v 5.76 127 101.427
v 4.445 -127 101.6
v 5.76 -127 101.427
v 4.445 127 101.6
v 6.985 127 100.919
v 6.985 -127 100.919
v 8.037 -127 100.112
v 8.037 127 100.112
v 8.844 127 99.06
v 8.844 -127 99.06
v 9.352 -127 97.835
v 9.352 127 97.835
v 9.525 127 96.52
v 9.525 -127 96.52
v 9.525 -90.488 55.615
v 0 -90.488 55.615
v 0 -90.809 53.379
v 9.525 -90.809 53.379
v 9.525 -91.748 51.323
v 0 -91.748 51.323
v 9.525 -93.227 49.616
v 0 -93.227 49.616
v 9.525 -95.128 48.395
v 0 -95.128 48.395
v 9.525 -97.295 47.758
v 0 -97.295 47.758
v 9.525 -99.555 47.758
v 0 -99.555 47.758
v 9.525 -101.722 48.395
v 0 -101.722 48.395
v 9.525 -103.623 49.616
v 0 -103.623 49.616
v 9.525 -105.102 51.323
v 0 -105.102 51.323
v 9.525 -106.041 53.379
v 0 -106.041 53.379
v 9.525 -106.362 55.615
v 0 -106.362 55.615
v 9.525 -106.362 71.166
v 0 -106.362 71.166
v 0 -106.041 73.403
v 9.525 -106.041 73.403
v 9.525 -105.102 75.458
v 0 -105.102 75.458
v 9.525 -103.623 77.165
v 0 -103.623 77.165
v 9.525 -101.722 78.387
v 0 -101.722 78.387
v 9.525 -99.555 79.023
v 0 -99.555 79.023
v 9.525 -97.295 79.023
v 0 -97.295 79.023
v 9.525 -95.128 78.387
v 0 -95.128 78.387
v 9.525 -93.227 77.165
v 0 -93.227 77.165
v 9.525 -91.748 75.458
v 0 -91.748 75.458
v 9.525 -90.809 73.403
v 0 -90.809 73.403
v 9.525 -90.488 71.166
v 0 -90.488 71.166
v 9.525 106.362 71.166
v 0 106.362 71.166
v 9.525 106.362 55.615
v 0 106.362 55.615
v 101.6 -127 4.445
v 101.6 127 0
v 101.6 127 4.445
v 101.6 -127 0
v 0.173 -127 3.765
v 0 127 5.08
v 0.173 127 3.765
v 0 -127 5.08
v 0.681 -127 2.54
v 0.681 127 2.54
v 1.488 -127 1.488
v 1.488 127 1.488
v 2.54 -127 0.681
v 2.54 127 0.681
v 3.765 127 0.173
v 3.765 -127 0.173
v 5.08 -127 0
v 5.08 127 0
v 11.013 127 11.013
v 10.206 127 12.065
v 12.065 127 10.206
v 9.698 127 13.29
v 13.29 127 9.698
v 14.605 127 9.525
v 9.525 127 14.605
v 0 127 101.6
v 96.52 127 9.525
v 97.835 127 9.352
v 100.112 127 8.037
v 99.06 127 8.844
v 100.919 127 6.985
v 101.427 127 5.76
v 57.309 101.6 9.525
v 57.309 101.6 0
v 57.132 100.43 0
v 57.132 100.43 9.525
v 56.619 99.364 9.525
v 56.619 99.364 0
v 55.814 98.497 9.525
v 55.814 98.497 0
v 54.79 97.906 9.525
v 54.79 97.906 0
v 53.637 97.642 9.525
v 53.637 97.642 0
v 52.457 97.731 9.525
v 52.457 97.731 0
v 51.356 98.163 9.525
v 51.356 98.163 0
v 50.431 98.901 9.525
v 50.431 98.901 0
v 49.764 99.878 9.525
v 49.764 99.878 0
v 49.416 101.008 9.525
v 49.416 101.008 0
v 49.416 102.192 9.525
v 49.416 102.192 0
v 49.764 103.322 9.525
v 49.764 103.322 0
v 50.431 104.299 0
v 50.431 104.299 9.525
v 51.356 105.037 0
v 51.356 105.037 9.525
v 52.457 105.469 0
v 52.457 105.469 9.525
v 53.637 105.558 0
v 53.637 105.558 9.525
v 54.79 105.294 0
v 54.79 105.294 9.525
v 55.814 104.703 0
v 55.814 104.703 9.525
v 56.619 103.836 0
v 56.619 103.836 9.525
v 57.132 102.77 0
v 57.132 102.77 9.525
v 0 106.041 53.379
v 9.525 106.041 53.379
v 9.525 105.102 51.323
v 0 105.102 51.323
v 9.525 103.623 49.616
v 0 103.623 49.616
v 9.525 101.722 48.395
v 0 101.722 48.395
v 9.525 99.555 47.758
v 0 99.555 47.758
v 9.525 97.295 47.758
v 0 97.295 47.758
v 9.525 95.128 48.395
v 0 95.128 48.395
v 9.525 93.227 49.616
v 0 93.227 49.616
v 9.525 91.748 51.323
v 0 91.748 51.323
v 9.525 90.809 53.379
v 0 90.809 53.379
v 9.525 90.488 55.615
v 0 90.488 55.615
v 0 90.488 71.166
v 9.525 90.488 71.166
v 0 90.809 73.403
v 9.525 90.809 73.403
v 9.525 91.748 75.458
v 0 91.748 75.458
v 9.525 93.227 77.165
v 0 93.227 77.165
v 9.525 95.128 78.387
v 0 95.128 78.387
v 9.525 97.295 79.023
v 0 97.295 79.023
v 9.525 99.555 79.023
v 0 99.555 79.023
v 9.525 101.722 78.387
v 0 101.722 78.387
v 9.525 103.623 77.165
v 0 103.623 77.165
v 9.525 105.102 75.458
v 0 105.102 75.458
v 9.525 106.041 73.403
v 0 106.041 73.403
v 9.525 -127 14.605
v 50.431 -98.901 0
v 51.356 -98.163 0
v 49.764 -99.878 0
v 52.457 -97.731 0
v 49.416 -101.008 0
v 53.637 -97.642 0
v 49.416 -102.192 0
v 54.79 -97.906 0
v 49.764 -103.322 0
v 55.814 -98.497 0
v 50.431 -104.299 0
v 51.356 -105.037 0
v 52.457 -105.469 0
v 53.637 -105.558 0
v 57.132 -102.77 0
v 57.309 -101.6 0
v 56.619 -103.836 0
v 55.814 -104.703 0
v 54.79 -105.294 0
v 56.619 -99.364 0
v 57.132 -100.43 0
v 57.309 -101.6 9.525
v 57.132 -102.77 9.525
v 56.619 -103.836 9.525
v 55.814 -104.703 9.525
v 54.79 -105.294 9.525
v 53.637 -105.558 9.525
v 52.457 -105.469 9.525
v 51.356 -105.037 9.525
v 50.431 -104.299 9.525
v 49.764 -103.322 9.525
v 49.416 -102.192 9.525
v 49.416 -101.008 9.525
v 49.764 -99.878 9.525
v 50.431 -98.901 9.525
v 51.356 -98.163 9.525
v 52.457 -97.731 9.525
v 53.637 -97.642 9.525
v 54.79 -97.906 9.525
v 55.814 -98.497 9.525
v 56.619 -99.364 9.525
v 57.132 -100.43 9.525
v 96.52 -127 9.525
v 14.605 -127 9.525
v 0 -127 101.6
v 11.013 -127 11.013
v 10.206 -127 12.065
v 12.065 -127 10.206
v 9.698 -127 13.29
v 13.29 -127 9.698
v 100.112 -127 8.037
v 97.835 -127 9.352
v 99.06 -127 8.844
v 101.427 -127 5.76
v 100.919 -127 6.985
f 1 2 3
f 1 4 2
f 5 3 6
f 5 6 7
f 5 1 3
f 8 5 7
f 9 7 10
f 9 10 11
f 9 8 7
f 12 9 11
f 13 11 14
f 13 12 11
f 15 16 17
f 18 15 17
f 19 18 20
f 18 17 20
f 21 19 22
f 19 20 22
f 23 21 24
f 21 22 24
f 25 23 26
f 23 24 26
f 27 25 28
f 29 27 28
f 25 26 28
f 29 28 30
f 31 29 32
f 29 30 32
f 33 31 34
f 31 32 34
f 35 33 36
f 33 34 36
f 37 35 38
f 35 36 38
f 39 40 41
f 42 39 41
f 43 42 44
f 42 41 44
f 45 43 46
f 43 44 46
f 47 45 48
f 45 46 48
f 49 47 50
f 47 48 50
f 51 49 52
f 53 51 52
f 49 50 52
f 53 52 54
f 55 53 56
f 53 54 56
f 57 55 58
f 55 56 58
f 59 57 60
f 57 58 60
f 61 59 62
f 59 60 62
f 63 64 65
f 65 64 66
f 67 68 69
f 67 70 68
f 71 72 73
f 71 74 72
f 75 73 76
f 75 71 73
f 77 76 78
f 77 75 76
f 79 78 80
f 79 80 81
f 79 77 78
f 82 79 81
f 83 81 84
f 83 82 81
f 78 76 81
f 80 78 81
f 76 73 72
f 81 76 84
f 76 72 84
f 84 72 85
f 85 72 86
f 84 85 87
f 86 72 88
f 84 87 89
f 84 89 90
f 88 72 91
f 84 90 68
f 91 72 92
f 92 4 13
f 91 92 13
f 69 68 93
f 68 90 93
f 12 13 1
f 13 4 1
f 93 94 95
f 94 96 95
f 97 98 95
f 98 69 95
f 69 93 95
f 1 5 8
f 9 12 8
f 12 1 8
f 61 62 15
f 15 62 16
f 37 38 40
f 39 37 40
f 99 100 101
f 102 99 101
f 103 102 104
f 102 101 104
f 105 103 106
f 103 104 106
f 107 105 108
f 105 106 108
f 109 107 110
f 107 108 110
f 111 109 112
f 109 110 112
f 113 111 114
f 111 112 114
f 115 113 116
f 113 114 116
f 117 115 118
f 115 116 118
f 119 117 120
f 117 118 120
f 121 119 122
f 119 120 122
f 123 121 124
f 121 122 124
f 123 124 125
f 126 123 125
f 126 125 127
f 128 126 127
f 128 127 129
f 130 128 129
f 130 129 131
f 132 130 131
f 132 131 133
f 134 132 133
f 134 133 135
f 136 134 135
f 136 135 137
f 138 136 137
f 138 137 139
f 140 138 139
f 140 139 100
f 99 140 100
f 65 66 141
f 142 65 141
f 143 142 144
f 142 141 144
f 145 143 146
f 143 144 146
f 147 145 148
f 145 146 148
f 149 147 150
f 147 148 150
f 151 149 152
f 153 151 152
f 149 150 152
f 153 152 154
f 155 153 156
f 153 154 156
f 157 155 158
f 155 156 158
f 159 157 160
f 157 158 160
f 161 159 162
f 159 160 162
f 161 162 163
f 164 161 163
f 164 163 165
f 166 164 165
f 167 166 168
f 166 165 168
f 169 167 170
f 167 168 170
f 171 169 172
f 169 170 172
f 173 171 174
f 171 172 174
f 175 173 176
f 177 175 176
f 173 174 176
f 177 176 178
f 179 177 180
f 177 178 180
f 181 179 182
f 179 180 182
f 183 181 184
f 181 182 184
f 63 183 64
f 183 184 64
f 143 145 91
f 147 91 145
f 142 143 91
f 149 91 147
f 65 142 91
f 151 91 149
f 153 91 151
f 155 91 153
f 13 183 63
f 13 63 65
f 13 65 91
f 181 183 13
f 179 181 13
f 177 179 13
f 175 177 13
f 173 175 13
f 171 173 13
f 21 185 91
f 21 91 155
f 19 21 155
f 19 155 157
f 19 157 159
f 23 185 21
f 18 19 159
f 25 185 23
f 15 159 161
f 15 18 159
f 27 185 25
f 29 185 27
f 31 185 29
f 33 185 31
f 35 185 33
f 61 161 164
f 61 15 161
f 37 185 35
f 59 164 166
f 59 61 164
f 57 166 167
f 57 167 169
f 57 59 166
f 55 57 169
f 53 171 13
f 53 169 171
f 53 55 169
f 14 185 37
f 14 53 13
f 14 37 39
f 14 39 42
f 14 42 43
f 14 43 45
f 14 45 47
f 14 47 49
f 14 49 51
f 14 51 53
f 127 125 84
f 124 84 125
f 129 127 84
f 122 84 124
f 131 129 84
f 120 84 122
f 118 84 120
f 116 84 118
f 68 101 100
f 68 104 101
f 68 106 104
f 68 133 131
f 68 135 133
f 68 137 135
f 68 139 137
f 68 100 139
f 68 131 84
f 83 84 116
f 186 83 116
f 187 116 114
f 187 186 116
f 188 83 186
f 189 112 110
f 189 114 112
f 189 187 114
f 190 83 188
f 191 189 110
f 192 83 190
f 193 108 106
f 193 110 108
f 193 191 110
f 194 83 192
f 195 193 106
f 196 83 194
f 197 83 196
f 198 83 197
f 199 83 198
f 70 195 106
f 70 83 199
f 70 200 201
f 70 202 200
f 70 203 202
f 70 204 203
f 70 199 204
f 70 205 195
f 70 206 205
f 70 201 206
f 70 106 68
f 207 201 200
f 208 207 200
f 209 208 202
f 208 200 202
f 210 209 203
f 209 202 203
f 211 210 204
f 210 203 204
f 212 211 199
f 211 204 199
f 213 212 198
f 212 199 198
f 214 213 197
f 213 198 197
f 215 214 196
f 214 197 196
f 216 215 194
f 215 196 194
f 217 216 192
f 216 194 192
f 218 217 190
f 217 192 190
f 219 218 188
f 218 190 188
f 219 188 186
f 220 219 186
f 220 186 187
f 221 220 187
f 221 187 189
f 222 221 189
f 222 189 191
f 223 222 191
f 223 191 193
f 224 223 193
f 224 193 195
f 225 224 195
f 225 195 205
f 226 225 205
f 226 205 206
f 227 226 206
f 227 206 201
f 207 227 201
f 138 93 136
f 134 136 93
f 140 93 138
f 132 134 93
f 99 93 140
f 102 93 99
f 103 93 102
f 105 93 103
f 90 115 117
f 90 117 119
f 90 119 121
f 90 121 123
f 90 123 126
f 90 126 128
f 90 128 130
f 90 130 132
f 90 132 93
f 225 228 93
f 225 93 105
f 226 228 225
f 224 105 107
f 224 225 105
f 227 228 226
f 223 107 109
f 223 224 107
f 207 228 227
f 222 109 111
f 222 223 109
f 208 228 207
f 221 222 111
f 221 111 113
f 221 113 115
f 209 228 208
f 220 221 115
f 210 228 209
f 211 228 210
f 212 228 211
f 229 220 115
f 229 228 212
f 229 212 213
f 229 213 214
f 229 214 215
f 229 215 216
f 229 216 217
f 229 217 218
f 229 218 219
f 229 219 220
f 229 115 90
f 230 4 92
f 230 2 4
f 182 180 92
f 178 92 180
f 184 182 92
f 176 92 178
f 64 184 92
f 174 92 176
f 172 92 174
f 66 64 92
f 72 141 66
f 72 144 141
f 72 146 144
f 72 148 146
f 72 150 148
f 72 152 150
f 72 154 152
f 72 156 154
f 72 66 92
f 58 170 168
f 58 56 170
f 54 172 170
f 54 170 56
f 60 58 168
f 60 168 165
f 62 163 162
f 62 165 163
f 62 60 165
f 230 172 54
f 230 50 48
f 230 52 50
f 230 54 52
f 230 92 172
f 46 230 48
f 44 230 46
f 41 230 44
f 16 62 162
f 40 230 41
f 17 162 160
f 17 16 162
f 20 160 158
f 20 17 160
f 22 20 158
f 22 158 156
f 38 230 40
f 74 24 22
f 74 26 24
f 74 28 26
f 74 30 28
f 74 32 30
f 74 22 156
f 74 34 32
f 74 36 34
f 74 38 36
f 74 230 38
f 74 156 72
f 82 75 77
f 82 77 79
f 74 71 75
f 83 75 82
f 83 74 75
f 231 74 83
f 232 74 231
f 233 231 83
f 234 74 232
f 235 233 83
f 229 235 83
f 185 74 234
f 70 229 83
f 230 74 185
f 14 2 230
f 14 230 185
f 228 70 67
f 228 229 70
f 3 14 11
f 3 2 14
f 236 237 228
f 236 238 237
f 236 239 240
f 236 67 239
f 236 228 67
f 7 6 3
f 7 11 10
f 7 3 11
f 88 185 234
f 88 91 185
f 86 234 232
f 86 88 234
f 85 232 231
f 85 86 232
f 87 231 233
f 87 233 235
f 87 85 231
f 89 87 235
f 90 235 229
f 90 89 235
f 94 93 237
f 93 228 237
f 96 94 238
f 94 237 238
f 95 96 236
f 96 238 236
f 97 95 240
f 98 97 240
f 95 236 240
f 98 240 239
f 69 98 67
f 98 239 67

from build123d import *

# Parameters (mm, degrees)
F1_DEPTH = 127
F2_R     = 5.08
F4_DEPTH = 25.4
F5_R     = 3.96875
F6_DEPTH = 25.4


with BuildPart() as f1:
    # F0 (on Front) → F1 (new body, symmetric)
    with BuildSketch(Plane.XZ):
        Polygon((0, 101.6), (0, 0), (101.6, 0), (101.6, 9.525), (9.525, 9.525), (9.525, 101.6), align=None)
    extrude(amount=F1_DEPTH, both=True)

    # F2
    f2_edges = [f1.edges().sort_by_distance(p)[0] for p in [
        (9.525, 0, 9.525),
        (0, 0, 0),
        (9.525, 0, 101.6),
        (101.6, 0, 9.525),
    ]]
    fillet(f2_edges, radius=F2_R)

    # F3 (on face) → F4 (cut)
    with BuildSketch(Plane(origin=(0, 0, 0), x_dir=(0, -1, 0), z_dir=(-1, 0, 0))):
        with BuildLine():
            Line((-90.4875, 55.614824), (-90.4875, 71.166491))
            ThreePointArc((-90.4875, 71.166491), (-98.425, 79.103991), (-106.3625, 71.166491))
            Line((-106.3625, 71.166491), (-106.3625, 55.614824))
            ThreePointArc((-106.3625, 55.614824), (-98.425, 47.677324), (-90.4875, 55.614824))
        make_face()
        with BuildLine():
            ThreePointArc((90.4875, 55.614824), (98.425, 47.677324), (106.3625, 55.614824))
            Line((106.3625, 55.614824), (106.3625, 71.166491))
            ThreePointArc((106.3625, 71.166491), (98.425, 79.103991), (90.4875, 71.166491))
            Line((90.4875, 71.166491), (90.4875, 55.614824))
        make_face()
    extrude(amount=-F4_DEPTH, mode=Mode.SUBTRACT)

    # F5 (on face) → F6 (cut)
    with BuildSketch(Plane(origin=(0, 0, 0), x_dir=(1, 0, 0), z_dir=(0, 0, -1))):
        with Locations((53.34, 101.6)):
            Circle(F5_R)
        with Locations((53.34, -101.6)):
            Circle(F5_R)
    extrude(amount=-F6_DEPTH, mode=Mode.SUBTRACT)


solid = f1.part
